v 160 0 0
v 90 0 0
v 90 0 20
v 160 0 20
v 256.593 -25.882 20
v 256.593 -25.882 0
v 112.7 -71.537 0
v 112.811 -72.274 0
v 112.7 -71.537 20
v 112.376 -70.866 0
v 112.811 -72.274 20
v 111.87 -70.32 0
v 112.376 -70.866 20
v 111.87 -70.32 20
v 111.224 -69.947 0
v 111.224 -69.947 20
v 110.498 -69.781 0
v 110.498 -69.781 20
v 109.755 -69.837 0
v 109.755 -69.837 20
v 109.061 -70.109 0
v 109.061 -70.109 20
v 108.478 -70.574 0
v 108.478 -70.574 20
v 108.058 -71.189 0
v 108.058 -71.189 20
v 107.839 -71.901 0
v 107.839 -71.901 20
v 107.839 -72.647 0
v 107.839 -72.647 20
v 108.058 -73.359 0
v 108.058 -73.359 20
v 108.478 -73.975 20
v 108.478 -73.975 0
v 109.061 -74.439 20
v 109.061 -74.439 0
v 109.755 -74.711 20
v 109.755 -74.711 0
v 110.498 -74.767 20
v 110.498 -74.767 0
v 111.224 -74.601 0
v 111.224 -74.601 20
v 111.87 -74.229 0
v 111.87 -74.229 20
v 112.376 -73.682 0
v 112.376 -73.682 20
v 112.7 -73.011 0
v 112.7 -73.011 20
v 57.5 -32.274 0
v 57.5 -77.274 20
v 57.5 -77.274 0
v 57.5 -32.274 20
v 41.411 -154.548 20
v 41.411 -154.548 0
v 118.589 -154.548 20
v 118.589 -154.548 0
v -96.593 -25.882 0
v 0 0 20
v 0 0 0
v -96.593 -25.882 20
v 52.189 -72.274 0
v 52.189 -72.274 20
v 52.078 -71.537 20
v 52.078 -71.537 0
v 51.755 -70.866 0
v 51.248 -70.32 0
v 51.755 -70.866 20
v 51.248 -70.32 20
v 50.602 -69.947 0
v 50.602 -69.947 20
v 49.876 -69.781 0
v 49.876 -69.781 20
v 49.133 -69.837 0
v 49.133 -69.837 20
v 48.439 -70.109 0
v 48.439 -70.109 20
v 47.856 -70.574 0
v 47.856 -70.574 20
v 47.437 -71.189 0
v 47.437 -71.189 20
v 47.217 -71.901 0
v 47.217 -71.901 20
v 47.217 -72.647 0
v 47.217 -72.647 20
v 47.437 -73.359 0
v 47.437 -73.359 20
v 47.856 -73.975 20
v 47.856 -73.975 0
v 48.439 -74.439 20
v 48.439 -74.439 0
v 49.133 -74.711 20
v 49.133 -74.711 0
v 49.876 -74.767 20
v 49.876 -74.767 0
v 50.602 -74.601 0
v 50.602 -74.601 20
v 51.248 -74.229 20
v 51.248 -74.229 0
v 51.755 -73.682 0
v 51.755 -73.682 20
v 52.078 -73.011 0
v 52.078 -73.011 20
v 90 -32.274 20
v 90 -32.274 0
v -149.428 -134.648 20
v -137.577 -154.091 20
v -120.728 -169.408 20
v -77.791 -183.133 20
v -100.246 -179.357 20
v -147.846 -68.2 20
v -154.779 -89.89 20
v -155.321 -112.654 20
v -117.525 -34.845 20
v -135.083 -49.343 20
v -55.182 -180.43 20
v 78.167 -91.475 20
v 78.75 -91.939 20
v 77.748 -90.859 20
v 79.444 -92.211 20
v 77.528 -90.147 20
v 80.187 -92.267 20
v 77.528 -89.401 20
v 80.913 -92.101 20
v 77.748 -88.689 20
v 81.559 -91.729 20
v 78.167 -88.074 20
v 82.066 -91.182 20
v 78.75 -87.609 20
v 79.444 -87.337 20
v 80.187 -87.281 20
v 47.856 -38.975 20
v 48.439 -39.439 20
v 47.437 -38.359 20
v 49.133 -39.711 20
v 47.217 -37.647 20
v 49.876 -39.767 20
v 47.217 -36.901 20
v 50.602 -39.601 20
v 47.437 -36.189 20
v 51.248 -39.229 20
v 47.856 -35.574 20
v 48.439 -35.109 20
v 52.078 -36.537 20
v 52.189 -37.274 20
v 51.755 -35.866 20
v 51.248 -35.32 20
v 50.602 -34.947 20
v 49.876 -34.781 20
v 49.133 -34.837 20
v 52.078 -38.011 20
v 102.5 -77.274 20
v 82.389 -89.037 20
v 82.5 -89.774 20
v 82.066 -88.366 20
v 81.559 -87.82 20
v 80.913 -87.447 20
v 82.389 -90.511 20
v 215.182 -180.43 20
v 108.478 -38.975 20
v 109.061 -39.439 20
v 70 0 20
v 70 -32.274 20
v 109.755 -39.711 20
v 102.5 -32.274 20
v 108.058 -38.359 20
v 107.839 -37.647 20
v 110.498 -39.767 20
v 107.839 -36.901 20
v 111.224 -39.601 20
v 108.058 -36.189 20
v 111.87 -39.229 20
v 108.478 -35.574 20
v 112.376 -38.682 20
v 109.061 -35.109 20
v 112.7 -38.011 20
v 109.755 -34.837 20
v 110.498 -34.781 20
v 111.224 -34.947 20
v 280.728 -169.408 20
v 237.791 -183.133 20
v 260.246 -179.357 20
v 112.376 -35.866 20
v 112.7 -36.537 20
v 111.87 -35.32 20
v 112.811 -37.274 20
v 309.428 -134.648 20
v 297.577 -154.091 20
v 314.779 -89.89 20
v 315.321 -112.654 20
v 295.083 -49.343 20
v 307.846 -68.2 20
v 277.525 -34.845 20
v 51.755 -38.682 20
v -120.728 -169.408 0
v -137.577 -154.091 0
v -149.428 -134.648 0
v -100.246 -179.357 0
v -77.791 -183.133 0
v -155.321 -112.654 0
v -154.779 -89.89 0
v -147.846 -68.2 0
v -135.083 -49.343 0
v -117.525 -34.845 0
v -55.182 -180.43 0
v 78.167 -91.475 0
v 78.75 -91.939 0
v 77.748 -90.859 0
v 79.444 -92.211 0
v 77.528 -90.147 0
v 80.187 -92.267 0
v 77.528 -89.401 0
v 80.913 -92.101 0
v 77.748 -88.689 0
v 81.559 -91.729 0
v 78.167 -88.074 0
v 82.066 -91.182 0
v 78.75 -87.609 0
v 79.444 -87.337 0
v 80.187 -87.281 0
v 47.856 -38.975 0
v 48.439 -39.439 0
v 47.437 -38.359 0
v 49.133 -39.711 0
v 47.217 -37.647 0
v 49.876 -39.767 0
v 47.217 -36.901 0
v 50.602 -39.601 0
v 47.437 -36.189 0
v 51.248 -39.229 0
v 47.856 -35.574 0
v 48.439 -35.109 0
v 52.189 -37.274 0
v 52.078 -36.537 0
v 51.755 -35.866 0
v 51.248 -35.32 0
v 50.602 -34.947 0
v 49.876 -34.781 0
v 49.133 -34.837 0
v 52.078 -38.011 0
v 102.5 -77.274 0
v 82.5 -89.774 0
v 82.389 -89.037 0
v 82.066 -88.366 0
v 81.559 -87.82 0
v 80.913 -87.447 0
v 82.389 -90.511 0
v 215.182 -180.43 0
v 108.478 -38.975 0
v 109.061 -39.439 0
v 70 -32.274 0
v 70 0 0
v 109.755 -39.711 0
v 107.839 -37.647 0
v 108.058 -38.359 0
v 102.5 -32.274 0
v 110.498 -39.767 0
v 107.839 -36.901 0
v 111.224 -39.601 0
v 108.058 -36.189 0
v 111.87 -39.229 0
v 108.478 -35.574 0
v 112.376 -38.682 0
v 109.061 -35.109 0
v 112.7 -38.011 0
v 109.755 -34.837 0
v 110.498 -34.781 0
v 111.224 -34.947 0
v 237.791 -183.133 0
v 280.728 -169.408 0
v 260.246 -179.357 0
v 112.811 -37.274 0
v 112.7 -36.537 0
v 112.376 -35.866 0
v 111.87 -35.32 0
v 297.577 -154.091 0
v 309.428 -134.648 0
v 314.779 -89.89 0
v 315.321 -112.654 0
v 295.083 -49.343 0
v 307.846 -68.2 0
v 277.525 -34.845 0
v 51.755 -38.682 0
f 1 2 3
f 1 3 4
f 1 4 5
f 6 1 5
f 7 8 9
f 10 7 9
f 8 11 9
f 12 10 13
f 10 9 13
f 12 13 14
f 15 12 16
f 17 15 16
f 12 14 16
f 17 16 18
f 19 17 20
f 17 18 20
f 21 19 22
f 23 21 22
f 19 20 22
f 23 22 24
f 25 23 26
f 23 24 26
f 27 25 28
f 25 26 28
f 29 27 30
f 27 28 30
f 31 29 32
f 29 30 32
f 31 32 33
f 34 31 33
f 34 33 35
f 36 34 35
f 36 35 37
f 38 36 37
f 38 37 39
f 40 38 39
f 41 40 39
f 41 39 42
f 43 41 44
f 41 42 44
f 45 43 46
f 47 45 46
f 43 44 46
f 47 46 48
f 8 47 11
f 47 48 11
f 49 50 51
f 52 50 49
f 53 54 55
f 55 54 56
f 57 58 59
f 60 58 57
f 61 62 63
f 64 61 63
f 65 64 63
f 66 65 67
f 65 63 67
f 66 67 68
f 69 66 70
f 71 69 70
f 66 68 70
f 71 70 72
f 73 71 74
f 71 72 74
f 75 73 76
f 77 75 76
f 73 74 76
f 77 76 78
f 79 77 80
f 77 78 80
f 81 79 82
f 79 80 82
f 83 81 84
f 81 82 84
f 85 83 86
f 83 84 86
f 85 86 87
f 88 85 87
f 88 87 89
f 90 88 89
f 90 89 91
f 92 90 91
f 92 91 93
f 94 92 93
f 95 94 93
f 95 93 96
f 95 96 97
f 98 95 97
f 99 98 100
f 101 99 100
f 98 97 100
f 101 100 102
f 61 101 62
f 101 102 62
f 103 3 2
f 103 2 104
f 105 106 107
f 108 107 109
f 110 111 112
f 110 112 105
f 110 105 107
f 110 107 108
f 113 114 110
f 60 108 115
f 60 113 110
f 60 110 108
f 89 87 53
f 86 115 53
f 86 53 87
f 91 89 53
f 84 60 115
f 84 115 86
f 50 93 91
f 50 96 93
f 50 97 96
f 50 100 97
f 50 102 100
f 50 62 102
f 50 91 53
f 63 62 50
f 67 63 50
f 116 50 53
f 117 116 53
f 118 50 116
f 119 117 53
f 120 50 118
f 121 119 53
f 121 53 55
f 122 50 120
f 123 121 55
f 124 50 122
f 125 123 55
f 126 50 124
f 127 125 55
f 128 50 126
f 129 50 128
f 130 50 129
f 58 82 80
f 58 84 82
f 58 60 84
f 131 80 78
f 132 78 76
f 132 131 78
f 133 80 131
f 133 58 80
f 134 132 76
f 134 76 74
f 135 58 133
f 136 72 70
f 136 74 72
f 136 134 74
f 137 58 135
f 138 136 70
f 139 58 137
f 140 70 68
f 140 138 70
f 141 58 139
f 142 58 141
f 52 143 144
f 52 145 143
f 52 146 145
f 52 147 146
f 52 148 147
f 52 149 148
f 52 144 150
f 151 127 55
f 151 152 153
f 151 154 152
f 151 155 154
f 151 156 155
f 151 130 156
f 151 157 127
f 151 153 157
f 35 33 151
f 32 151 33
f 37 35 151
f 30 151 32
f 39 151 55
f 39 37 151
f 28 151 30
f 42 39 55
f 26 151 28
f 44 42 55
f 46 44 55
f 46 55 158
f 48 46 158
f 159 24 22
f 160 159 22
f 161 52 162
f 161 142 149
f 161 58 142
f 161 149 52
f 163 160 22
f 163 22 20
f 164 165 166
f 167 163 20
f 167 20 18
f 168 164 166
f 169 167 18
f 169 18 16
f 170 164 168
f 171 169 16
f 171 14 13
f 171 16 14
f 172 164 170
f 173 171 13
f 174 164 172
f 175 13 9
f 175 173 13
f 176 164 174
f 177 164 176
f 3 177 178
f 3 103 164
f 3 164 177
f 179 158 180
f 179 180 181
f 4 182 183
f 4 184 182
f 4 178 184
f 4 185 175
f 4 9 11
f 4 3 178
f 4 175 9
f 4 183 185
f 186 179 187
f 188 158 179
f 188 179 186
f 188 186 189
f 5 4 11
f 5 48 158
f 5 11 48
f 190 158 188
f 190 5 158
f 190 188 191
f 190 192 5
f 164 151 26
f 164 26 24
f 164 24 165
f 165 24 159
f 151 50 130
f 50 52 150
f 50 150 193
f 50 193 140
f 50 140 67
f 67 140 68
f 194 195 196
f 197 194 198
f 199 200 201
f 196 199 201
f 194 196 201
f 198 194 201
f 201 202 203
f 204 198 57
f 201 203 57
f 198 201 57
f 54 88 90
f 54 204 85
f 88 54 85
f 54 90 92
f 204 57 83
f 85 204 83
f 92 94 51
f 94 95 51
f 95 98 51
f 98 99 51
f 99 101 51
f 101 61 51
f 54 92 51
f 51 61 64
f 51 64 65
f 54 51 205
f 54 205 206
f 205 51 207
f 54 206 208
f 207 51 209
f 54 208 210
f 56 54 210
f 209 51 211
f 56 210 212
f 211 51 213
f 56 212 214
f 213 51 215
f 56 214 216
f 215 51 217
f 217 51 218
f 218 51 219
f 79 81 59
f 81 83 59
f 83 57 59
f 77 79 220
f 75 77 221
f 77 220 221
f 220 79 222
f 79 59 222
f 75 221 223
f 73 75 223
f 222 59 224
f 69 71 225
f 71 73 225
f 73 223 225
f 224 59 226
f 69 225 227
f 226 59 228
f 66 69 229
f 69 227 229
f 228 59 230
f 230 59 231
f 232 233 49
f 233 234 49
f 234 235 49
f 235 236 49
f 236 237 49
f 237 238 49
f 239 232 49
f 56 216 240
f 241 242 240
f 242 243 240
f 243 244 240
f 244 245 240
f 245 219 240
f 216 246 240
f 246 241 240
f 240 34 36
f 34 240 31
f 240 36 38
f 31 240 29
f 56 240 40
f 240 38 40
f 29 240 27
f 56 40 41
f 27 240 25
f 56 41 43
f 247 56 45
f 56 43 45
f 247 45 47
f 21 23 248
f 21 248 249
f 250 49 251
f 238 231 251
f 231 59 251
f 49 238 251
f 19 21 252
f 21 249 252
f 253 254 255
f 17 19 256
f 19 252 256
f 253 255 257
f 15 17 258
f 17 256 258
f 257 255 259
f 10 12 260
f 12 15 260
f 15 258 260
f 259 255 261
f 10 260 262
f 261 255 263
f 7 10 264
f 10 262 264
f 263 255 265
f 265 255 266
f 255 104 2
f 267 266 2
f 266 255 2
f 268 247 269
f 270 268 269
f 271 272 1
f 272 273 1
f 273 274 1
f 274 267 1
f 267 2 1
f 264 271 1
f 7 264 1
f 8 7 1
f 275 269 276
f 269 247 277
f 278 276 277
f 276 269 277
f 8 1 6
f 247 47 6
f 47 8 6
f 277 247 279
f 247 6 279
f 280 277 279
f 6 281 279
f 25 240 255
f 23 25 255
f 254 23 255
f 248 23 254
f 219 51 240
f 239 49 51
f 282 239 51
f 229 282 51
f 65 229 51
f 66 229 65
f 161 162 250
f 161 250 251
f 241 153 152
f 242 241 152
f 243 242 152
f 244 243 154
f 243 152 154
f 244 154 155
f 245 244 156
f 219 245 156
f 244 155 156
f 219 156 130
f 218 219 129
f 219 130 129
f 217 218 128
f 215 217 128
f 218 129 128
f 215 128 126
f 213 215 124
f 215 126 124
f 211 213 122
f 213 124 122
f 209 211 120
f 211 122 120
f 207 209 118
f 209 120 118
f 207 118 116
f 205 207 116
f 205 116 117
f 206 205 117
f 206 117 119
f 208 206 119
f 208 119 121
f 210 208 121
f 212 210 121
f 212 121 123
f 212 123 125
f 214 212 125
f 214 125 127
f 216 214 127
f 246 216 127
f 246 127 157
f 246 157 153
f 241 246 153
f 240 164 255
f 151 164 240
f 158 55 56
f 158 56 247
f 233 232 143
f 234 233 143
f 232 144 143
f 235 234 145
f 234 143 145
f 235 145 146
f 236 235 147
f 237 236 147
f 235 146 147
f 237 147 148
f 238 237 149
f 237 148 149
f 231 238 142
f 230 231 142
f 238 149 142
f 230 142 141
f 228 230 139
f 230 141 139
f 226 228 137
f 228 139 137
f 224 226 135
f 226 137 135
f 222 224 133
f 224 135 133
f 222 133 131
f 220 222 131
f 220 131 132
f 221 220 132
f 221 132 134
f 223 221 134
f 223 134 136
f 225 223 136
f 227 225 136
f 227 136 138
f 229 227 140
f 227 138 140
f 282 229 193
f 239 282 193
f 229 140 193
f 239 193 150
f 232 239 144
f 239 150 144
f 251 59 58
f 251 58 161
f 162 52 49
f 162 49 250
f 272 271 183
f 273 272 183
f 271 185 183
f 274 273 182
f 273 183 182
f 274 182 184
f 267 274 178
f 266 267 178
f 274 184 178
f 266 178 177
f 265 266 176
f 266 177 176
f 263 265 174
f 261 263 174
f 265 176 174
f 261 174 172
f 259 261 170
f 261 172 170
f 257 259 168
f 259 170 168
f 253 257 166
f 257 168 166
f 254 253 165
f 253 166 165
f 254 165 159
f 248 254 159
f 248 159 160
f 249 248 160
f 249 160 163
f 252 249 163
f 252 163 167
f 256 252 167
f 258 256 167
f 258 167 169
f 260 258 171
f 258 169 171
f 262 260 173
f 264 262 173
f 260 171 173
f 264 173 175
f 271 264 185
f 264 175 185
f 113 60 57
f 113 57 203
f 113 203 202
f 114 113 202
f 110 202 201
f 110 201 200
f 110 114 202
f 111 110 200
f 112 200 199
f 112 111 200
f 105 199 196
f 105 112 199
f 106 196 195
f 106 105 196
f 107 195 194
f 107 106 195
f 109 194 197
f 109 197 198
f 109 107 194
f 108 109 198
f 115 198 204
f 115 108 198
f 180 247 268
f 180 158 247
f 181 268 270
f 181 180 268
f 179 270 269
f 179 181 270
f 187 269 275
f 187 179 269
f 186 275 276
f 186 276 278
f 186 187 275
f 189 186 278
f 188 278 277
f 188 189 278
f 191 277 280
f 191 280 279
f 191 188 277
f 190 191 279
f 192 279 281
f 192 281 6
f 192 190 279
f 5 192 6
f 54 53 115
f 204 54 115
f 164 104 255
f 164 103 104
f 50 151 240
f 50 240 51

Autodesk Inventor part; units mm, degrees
ref_plane "YZ Plane" through (0, 0, 0) normal (1, 0, 0) x (0, 1, 0)
ref_plane "XZ Plane" through (0, 0, 0) normal (0, 1, 0) x (-1, 0, 0)
ref_plane "XY Plane" through (0, 0, 0) normal (0, 0, 1) x (1, 0, 0)
sketch "Sketch1" plane through (0, 0, 0) normal (0, 0, 1) x (1, 0, 0)
  line L0 (0, 0) -> (160, 0)
  line L1 (160, 0) -> (118.589, -154.5481)
  line L2 (0, 0) -> (41.411, -154.5481)
  line L3 (41.411, -154.5481) -> (118.589, -154.5481)
  dimension "d0" = 160
  dimension "d1" = 160
  dimension "d2" = 160
  dimension "d3" = 75
  dimension "d4" = 75
extrude "Extrusion1" add sketch "Sketch1" along normal blind 20
sketch "Sketch3" plane through (0, 0, 20) normal (0, 0, 1) x (1, 0, 0)
  line L0 (57.5, -32.2741) -> (102.5, -32.2741)
  line L1 (102.5, -32.2741) -> (102.5, -77.2741)
  line L2 (102.5, -77.2741) -> (57.5, -77.2741)
  line L3 (57.5, -77.2741) -> (57.5, -32.2741)
  line L4 (0, 0) -> (41.411, -154.5481) projected
  line L5 (160, 0) -> (0, 0) projected
  line L6 (70, 0) -> (90, 0)
  line L7 (90, 0) -> (90, -32.2741)
  line L8 (90, -32.2741) -> (70, -32.2741)
  line L9 (70, -32.2741) -> (70, 0)
  point P0 (20.7055, -77.2741)
  point P1 (80, 0)
  point P2 (80, -32.2741)
  point P3 (80, -32.2741)
  point P4 (80, 0)
  dimension "d10" = 45
  dimension "d11" = 45
  dimension "d14" = 20
extrude "Extrusion3" cut sketch "Sketch3" against normal blind 40
sketch "Sketch4" plane through (0, 0, 20) normal (0, 0, 1) x (1, 0, 0)
  line L0 (70, -32.2741) -> (70, 0) projected
  line L1 (70, 0) -> (0, 0) projected
  line L2 (0, 0) -> (41.411, -154.5481) projected
  line L3 (41.411, -154.5481) -> (118.589, -154.5481) projected
  line L4 (118.589, -154.5481) -> (160, 0) projected
  line L5 (160, 0) -> (90, 0) projected
  line L6 (90, 0) -> (90, -32.2741) projected
  line L7 (90, -32.2741) -> (102.5, -32.2741) projected
  line L8 (102.5, -32.2741) -> (102.5, -77.2741) construction
  line L9 (102.5, -77.2741) -> (57.5, -77.2741) projected
  line L10 (57.5, -77.2741) -> (57.5, -32.2741) projected
  line L11 (57.5, -32.2741) -> (70, -32.2741) projected
  line L12 (57.5, -77.2741) -> (102.5, -77.2741) construction
  line L13 (102.5, -77.2741) -> (102.5, -32.2741)
  line L14 (102.5, -32.2741) -> (57.5, -32.2741) construction
  line L15 (57.5, -32.2741) -> (57.5, -77.2741) construction
  line L16 (57.5, -77.2741) -> (102.5, -32.2741) construction
  line L17 (102.5, -77.2741) -> (57.5, -32.2741) construction
  circle A0 centre (80, -19.7741) radius 2.5
  circle A1 centre (49.6891, -37.2741) radius 2.5
  circle A2 centre (49.6891, -72.2741) radius 2.5
  circle A3 centre (80, -89.7741) radius 2.5
  circle A4 centre (110.3109, -72.2741) radius 2.5
  circle A5 centre (110.3109, -37.2741) radius 2.5
  point P0 (80, -54.7741)
  point P1 (80, -54.7741)
  dimension "d15" = 45
  dimension "d16" = 45
  dimension "d17" = 5
  dimension "d18" = 35
  dimension "d21" = 360
extrude "Extrusion4" cut sketch "Sketch4" against normal through all contours A1 | A2 | A3 | A4 | A5
sketch "Sketch5" plane through (0, 0, 20) normal (0, 0, 1) x (1, 0, 0)
  line L0 (160, 0) -> (90, 0) projected
  line L1 (160, 0) -> (256.5926, -25.8819)
  line L2 (118.589, -154.5481) -> (41.411, -154.5481) projected
  line L3 (118.589, -154.5481) -> (215.1815, -180.43)
  circle A0 centre (235.8871, -103.156) radius 80 construction
  arc A1 (215.1815, -180.43) -> (256.5926, -25.8819) centre (235.8871, -103.156) ccw
  line L4 (160, 0) -> (118.589, -154.5481)
  line L5 (0, 0) -> (41.411, -154.5481) projected
  line L6 (0, 0) -> (-96.5926, -25.8819)
  line L7 (41.411, -154.5481) -> (118.589, -154.5481) projected
  line L8 (41.411, -154.5481) -> (-55.1815, -180.43)
  circle A2 centre (-75.8871, -103.156) radius 80 construction
  arc A3 (-96.5926, -25.8819) -> (-55.1815, -180.43) centre (-75.8871, -103.156) ccw
  dimension "d25" = 100
  dimension "d26" = 100
  dimension "d27" = 160
  dimension "d30" = 100
  dimension "d31" = 100
  dimension "d32" = 160
extrude "Extrusion5" add sketch "Sketch5" against normal blind 20
properties part number "HA002" material "ABS Plastic"
